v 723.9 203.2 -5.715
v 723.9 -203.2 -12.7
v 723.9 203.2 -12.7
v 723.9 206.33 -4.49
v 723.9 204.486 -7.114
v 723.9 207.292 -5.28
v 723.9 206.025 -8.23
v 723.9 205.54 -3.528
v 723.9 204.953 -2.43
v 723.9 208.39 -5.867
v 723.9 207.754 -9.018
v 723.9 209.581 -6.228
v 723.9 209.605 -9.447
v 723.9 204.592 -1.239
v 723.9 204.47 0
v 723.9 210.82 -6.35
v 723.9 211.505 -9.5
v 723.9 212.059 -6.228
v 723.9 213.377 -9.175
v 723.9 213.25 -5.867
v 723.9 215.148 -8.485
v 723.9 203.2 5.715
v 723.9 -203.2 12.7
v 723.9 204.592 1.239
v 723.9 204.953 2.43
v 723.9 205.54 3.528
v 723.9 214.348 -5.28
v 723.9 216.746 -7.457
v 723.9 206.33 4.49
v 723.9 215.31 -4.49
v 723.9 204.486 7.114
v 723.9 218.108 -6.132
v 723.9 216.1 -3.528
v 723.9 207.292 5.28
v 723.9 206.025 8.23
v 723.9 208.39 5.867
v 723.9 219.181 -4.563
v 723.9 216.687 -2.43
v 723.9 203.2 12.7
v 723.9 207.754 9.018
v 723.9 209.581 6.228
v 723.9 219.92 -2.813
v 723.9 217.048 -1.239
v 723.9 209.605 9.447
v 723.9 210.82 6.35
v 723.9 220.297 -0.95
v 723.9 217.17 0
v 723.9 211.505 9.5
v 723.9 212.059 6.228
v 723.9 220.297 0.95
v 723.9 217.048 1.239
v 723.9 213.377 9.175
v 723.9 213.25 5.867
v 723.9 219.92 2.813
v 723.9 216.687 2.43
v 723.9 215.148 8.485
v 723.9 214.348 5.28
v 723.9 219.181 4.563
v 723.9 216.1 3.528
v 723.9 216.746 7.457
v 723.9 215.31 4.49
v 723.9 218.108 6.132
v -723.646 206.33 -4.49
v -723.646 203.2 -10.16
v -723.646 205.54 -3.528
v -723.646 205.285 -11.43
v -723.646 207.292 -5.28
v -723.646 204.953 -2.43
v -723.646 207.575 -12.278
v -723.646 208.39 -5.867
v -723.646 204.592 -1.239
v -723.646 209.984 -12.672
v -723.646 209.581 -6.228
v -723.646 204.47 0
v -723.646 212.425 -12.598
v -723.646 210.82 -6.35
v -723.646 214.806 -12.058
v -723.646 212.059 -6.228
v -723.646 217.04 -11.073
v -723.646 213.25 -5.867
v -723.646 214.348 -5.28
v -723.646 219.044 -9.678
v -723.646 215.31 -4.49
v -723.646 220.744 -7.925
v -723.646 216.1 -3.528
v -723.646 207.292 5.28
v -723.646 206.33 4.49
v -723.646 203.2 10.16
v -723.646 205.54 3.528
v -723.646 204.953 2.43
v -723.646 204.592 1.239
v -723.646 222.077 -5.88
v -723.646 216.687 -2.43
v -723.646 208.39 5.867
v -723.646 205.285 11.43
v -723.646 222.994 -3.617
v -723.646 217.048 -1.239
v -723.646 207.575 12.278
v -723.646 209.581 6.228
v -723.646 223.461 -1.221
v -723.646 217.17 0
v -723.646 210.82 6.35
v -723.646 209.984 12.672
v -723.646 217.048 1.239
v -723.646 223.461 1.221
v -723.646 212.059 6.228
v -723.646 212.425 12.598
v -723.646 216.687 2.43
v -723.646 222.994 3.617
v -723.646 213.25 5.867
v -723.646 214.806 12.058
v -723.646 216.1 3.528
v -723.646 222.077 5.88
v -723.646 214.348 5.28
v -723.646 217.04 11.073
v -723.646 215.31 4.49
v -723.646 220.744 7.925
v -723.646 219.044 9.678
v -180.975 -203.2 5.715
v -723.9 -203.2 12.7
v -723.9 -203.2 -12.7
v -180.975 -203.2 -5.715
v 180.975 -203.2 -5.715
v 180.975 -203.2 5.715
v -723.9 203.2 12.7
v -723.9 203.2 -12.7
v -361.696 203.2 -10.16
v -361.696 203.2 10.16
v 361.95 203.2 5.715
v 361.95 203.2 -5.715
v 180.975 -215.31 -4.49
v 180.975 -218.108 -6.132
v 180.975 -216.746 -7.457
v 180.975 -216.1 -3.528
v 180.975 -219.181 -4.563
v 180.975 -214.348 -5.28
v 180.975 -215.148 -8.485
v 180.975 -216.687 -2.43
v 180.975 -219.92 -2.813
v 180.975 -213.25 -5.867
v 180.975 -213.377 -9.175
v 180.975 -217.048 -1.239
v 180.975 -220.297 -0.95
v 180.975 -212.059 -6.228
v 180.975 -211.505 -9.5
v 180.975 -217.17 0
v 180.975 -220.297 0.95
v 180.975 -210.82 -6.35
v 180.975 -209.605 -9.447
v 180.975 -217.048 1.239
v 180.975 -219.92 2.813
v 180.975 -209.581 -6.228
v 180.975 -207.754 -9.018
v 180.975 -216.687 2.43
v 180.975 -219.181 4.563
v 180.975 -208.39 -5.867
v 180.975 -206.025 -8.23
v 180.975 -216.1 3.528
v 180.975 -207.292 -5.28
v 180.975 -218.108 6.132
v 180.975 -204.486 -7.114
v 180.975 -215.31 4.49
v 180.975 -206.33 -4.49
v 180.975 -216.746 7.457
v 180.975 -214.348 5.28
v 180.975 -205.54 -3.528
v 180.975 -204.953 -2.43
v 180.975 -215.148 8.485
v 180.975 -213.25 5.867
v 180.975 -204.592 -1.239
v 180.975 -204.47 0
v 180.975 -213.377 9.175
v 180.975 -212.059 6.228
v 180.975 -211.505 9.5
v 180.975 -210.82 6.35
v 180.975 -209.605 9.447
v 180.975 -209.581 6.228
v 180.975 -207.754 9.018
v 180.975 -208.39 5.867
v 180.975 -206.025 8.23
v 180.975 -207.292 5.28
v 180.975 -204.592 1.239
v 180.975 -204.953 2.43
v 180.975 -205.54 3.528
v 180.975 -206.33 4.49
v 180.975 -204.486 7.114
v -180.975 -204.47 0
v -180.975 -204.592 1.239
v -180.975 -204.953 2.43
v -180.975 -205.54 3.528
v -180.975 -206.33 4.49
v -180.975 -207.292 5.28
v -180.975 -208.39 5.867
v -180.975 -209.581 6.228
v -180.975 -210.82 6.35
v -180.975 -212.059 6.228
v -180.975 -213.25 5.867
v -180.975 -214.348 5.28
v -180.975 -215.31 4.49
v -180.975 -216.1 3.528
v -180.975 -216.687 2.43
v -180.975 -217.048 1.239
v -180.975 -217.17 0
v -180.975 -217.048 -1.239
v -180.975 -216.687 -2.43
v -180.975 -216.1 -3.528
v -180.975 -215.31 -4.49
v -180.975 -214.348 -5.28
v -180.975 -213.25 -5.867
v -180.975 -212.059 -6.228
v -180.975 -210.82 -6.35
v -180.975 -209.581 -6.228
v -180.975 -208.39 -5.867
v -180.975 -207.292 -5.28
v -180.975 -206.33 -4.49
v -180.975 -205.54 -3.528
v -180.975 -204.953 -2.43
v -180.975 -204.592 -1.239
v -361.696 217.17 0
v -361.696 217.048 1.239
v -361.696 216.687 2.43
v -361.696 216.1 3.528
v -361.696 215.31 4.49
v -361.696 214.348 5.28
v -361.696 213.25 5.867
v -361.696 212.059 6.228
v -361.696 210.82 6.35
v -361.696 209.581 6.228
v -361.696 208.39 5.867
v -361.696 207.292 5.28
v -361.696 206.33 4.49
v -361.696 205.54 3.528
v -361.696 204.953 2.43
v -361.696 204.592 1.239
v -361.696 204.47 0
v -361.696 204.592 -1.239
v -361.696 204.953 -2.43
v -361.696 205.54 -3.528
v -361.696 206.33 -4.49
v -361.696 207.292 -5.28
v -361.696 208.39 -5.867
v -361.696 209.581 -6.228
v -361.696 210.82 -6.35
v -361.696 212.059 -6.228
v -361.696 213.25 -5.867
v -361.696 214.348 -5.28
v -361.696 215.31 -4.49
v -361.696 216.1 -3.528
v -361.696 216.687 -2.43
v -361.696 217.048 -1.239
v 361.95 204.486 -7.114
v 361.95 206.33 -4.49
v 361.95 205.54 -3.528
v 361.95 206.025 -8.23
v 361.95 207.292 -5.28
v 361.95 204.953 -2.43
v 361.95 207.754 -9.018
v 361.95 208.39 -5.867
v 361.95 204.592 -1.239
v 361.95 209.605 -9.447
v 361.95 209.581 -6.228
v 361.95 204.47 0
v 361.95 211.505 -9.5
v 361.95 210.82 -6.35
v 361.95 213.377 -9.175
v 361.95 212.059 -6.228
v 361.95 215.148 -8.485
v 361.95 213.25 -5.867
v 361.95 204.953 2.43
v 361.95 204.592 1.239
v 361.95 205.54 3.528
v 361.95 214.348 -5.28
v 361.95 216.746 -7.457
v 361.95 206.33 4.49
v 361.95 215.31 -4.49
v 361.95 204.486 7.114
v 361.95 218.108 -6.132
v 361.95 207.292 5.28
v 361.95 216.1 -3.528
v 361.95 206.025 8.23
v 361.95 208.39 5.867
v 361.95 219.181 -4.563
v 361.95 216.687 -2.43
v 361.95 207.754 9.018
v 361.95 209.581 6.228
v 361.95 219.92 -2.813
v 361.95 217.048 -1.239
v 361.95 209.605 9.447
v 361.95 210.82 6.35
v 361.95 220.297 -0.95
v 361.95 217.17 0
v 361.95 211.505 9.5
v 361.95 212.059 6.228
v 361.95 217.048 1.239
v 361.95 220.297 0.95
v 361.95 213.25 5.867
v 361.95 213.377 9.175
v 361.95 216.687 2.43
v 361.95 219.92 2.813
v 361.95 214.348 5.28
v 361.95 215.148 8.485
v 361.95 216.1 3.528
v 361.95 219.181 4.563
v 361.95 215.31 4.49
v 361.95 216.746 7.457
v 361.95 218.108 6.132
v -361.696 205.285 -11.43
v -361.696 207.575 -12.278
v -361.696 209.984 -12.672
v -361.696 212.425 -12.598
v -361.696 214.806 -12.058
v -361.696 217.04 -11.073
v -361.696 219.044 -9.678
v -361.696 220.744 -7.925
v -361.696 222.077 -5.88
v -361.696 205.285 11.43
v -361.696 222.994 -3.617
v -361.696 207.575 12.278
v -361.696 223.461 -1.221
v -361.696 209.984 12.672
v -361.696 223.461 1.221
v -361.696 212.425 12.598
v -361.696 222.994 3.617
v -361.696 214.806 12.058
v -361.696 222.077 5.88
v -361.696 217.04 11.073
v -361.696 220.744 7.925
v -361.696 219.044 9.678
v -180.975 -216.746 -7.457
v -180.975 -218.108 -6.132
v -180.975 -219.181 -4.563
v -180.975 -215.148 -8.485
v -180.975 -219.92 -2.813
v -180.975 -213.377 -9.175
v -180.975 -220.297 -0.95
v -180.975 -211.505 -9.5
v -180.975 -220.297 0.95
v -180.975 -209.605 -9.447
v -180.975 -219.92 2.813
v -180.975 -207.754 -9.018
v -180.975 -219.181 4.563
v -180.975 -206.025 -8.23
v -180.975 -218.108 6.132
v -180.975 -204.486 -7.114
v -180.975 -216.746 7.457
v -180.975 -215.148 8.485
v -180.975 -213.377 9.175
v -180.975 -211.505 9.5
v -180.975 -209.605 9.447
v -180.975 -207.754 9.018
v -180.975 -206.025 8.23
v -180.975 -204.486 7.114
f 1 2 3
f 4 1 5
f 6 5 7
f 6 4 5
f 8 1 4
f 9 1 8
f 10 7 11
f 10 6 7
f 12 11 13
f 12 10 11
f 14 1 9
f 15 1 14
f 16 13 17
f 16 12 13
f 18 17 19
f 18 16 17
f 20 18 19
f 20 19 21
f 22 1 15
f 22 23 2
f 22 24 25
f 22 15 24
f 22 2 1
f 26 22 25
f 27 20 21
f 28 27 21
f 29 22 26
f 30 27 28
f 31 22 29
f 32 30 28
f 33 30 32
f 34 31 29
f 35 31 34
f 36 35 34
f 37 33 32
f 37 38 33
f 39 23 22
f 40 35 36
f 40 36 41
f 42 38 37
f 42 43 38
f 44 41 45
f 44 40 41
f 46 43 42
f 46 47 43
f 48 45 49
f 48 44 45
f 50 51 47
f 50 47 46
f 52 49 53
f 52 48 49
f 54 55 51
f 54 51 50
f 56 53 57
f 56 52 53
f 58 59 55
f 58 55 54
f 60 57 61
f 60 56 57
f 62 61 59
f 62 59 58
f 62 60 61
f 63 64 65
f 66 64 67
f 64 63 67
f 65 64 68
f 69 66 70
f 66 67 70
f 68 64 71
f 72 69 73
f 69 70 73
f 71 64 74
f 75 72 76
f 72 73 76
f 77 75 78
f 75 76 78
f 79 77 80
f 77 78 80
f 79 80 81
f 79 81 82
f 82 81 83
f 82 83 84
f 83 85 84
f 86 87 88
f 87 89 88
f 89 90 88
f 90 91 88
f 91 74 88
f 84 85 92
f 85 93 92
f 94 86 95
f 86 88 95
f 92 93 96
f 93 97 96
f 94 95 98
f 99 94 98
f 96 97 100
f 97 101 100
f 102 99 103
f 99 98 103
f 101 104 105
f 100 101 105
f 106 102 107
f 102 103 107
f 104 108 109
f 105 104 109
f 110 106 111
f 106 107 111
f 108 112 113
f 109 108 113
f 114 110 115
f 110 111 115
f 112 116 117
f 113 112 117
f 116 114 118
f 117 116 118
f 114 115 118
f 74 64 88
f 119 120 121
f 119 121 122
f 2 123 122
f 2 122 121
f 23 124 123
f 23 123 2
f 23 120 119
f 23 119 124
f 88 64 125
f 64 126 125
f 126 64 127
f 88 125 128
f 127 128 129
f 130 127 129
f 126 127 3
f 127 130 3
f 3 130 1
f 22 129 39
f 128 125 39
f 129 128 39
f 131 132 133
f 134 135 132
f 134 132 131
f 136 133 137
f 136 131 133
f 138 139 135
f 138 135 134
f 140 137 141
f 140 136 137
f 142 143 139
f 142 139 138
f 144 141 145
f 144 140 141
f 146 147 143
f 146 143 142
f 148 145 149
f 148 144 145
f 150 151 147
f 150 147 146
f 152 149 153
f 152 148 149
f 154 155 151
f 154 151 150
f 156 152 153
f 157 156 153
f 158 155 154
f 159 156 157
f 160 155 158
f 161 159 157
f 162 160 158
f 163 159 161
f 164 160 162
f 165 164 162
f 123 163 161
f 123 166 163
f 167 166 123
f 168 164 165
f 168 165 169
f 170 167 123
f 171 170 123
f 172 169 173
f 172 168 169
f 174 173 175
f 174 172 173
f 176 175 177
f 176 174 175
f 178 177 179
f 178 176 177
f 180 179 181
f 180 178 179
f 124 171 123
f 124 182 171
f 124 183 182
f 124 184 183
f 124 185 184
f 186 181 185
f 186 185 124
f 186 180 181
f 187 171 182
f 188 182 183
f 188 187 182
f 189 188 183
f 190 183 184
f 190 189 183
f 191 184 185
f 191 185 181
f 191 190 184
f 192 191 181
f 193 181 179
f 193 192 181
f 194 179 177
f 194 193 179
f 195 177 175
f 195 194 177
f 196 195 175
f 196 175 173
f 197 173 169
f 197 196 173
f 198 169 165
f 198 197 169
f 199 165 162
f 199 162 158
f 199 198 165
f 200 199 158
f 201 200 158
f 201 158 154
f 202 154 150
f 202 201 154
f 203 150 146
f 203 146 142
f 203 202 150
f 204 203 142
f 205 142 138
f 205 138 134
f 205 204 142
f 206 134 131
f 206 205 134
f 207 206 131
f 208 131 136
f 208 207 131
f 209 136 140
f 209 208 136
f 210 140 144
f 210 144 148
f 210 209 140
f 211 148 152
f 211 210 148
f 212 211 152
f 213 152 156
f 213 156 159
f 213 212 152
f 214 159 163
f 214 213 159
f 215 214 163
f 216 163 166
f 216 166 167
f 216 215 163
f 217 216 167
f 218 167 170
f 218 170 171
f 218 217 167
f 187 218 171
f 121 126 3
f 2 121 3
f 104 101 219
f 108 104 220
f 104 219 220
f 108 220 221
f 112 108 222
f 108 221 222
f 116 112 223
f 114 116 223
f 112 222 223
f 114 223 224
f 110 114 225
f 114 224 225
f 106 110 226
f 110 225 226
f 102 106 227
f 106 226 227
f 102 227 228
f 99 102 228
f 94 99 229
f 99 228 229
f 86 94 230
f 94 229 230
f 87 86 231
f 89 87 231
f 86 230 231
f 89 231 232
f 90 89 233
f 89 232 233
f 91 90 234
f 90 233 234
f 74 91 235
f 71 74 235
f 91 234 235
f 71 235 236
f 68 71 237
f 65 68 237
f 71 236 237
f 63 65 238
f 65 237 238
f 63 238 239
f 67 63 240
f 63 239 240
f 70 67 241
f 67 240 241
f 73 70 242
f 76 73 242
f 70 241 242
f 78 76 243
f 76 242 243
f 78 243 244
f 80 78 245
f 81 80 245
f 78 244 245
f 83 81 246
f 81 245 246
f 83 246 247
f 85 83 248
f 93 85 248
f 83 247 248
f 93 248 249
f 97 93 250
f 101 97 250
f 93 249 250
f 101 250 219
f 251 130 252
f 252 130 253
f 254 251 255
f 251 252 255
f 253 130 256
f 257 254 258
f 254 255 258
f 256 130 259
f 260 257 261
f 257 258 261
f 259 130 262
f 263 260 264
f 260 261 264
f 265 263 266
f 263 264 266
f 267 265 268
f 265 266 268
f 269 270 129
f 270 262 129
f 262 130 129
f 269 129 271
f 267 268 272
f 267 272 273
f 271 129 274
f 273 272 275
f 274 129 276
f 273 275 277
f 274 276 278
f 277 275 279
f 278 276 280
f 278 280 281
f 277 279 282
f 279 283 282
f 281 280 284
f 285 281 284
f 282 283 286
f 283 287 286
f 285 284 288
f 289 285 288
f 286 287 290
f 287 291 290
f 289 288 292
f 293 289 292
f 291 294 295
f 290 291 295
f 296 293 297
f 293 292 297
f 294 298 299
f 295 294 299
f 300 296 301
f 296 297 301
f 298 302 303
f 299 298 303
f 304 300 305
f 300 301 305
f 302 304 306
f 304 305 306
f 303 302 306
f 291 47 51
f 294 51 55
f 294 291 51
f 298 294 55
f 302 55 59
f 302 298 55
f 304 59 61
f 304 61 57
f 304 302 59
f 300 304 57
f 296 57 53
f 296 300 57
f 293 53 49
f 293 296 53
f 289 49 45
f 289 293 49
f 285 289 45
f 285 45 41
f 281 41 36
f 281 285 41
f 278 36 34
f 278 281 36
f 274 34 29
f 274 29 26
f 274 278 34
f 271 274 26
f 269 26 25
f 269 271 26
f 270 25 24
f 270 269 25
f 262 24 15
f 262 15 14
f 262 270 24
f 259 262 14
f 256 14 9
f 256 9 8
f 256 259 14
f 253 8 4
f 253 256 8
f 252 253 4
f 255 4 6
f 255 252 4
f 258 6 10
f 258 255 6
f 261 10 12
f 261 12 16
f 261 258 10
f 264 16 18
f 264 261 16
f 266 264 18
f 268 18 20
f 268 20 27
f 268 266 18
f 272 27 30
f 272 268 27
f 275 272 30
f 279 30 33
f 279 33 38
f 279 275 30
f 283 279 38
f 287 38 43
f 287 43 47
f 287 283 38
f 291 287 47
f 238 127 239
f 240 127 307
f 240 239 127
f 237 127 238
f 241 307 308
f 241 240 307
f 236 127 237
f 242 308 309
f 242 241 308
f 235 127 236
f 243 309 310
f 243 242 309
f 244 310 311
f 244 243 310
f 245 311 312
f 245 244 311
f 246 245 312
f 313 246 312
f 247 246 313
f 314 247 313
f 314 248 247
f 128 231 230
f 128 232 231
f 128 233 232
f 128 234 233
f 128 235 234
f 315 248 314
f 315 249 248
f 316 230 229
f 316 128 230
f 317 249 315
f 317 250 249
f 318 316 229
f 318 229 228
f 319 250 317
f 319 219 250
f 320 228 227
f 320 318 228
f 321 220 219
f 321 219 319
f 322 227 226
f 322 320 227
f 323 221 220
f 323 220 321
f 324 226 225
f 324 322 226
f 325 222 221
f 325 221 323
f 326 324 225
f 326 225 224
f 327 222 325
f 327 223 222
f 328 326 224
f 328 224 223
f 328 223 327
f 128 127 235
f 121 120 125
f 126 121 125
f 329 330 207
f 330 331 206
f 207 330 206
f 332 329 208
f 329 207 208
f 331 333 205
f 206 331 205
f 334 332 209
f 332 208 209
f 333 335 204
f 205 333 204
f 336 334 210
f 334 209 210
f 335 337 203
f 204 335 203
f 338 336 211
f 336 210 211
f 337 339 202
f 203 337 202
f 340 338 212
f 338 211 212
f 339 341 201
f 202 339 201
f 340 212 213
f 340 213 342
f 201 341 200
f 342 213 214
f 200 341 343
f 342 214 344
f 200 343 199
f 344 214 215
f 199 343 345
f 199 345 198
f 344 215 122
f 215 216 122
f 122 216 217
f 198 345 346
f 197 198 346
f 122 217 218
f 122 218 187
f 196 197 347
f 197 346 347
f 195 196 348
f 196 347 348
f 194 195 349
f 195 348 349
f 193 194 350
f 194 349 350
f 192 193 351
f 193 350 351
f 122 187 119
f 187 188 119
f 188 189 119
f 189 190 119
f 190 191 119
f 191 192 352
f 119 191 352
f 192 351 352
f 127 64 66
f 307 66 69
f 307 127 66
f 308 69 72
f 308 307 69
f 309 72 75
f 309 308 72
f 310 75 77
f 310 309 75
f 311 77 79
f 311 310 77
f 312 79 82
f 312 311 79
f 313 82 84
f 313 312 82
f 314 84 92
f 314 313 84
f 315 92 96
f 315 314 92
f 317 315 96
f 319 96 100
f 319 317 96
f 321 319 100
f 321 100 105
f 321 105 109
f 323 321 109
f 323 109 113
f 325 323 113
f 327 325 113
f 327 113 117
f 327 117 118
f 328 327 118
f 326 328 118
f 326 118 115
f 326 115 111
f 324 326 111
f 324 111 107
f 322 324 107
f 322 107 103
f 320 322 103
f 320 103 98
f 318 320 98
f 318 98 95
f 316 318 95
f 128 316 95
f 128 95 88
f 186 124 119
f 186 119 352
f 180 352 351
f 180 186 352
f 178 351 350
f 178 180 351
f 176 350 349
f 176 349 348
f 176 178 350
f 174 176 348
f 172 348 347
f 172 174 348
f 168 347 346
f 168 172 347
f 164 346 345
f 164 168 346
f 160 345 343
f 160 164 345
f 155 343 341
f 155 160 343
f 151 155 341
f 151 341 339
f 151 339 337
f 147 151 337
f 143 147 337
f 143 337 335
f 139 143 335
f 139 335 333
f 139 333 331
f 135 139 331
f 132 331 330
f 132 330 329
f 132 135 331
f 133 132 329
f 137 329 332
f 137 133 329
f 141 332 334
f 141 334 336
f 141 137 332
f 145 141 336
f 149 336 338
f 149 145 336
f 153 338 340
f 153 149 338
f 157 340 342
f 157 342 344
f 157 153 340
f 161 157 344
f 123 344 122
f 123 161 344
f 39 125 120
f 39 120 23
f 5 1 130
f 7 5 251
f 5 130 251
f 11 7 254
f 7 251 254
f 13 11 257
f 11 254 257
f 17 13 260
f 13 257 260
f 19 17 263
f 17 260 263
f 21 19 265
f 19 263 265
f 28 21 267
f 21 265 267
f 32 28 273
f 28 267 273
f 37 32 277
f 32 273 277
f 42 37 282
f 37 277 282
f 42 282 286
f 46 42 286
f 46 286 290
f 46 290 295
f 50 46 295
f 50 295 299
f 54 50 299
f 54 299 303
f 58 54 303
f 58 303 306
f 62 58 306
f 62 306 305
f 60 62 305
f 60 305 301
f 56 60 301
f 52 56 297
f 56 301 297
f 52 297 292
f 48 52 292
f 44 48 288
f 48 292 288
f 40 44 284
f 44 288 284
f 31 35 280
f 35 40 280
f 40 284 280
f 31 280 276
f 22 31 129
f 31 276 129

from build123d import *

# Parameters (mm, degrees)
F0_W     = 1447.8
F0_H     = 406.4
F6_DEPTH = 12.7
F1_R     = 9.525
F1_R_2   = 6.35
F7_DEPTH = 180.975
F5_R     = 9.525
F5_R_2   = 6.35
F8_DEPTH = 361.95
F4_R     = 12.7
F4_R_2   = 6.35
F9_DEPTH = 361.95


with BuildPart() as f6:
    # F0 (on Top) → F6 (new body, symmetric)
    with BuildSketch(Plane.XY):
        Rectangle(F0_W, F0_H)
    extrude(amount=F6_DEPTH, both=True)

    # F1 (on Right) → F7 (join, symmetric)
    with BuildSketch(Plane.YZ):
        with Locations((-210.82, 0)):
            Circle(F1_R)
        with Locations((-210.82, 0)):
            Circle(F1_R_2, mode=Mode.SUBTRACT)
    extrude(amount=F7_DEPTH, both=True)

    # F5 (on offset) → F8 (join)
    with BuildSketch(Plane.YZ.offset(361.95)):
        with Locations((210.82, 0)):
            Circle(F5_R)
        with Locations((210.82, 0)):
            Circle(F5_R_2, mode=Mode.SUBTRACT)
    extrude(amount=F8_DEPTH)

    # F4 (on offset) → F9 (join)
    with BuildSketch(Plane.YZ.offset(-361.696)):
        with Locations((210.82, 0)):
            Circle(F4_R)
        with Locations((210.82, 0)):
            Circle(F4_R_2, mode=Mode.SUBTRACT)
    extrude(amount=-F9_DEPTH)


solid = f6.part
